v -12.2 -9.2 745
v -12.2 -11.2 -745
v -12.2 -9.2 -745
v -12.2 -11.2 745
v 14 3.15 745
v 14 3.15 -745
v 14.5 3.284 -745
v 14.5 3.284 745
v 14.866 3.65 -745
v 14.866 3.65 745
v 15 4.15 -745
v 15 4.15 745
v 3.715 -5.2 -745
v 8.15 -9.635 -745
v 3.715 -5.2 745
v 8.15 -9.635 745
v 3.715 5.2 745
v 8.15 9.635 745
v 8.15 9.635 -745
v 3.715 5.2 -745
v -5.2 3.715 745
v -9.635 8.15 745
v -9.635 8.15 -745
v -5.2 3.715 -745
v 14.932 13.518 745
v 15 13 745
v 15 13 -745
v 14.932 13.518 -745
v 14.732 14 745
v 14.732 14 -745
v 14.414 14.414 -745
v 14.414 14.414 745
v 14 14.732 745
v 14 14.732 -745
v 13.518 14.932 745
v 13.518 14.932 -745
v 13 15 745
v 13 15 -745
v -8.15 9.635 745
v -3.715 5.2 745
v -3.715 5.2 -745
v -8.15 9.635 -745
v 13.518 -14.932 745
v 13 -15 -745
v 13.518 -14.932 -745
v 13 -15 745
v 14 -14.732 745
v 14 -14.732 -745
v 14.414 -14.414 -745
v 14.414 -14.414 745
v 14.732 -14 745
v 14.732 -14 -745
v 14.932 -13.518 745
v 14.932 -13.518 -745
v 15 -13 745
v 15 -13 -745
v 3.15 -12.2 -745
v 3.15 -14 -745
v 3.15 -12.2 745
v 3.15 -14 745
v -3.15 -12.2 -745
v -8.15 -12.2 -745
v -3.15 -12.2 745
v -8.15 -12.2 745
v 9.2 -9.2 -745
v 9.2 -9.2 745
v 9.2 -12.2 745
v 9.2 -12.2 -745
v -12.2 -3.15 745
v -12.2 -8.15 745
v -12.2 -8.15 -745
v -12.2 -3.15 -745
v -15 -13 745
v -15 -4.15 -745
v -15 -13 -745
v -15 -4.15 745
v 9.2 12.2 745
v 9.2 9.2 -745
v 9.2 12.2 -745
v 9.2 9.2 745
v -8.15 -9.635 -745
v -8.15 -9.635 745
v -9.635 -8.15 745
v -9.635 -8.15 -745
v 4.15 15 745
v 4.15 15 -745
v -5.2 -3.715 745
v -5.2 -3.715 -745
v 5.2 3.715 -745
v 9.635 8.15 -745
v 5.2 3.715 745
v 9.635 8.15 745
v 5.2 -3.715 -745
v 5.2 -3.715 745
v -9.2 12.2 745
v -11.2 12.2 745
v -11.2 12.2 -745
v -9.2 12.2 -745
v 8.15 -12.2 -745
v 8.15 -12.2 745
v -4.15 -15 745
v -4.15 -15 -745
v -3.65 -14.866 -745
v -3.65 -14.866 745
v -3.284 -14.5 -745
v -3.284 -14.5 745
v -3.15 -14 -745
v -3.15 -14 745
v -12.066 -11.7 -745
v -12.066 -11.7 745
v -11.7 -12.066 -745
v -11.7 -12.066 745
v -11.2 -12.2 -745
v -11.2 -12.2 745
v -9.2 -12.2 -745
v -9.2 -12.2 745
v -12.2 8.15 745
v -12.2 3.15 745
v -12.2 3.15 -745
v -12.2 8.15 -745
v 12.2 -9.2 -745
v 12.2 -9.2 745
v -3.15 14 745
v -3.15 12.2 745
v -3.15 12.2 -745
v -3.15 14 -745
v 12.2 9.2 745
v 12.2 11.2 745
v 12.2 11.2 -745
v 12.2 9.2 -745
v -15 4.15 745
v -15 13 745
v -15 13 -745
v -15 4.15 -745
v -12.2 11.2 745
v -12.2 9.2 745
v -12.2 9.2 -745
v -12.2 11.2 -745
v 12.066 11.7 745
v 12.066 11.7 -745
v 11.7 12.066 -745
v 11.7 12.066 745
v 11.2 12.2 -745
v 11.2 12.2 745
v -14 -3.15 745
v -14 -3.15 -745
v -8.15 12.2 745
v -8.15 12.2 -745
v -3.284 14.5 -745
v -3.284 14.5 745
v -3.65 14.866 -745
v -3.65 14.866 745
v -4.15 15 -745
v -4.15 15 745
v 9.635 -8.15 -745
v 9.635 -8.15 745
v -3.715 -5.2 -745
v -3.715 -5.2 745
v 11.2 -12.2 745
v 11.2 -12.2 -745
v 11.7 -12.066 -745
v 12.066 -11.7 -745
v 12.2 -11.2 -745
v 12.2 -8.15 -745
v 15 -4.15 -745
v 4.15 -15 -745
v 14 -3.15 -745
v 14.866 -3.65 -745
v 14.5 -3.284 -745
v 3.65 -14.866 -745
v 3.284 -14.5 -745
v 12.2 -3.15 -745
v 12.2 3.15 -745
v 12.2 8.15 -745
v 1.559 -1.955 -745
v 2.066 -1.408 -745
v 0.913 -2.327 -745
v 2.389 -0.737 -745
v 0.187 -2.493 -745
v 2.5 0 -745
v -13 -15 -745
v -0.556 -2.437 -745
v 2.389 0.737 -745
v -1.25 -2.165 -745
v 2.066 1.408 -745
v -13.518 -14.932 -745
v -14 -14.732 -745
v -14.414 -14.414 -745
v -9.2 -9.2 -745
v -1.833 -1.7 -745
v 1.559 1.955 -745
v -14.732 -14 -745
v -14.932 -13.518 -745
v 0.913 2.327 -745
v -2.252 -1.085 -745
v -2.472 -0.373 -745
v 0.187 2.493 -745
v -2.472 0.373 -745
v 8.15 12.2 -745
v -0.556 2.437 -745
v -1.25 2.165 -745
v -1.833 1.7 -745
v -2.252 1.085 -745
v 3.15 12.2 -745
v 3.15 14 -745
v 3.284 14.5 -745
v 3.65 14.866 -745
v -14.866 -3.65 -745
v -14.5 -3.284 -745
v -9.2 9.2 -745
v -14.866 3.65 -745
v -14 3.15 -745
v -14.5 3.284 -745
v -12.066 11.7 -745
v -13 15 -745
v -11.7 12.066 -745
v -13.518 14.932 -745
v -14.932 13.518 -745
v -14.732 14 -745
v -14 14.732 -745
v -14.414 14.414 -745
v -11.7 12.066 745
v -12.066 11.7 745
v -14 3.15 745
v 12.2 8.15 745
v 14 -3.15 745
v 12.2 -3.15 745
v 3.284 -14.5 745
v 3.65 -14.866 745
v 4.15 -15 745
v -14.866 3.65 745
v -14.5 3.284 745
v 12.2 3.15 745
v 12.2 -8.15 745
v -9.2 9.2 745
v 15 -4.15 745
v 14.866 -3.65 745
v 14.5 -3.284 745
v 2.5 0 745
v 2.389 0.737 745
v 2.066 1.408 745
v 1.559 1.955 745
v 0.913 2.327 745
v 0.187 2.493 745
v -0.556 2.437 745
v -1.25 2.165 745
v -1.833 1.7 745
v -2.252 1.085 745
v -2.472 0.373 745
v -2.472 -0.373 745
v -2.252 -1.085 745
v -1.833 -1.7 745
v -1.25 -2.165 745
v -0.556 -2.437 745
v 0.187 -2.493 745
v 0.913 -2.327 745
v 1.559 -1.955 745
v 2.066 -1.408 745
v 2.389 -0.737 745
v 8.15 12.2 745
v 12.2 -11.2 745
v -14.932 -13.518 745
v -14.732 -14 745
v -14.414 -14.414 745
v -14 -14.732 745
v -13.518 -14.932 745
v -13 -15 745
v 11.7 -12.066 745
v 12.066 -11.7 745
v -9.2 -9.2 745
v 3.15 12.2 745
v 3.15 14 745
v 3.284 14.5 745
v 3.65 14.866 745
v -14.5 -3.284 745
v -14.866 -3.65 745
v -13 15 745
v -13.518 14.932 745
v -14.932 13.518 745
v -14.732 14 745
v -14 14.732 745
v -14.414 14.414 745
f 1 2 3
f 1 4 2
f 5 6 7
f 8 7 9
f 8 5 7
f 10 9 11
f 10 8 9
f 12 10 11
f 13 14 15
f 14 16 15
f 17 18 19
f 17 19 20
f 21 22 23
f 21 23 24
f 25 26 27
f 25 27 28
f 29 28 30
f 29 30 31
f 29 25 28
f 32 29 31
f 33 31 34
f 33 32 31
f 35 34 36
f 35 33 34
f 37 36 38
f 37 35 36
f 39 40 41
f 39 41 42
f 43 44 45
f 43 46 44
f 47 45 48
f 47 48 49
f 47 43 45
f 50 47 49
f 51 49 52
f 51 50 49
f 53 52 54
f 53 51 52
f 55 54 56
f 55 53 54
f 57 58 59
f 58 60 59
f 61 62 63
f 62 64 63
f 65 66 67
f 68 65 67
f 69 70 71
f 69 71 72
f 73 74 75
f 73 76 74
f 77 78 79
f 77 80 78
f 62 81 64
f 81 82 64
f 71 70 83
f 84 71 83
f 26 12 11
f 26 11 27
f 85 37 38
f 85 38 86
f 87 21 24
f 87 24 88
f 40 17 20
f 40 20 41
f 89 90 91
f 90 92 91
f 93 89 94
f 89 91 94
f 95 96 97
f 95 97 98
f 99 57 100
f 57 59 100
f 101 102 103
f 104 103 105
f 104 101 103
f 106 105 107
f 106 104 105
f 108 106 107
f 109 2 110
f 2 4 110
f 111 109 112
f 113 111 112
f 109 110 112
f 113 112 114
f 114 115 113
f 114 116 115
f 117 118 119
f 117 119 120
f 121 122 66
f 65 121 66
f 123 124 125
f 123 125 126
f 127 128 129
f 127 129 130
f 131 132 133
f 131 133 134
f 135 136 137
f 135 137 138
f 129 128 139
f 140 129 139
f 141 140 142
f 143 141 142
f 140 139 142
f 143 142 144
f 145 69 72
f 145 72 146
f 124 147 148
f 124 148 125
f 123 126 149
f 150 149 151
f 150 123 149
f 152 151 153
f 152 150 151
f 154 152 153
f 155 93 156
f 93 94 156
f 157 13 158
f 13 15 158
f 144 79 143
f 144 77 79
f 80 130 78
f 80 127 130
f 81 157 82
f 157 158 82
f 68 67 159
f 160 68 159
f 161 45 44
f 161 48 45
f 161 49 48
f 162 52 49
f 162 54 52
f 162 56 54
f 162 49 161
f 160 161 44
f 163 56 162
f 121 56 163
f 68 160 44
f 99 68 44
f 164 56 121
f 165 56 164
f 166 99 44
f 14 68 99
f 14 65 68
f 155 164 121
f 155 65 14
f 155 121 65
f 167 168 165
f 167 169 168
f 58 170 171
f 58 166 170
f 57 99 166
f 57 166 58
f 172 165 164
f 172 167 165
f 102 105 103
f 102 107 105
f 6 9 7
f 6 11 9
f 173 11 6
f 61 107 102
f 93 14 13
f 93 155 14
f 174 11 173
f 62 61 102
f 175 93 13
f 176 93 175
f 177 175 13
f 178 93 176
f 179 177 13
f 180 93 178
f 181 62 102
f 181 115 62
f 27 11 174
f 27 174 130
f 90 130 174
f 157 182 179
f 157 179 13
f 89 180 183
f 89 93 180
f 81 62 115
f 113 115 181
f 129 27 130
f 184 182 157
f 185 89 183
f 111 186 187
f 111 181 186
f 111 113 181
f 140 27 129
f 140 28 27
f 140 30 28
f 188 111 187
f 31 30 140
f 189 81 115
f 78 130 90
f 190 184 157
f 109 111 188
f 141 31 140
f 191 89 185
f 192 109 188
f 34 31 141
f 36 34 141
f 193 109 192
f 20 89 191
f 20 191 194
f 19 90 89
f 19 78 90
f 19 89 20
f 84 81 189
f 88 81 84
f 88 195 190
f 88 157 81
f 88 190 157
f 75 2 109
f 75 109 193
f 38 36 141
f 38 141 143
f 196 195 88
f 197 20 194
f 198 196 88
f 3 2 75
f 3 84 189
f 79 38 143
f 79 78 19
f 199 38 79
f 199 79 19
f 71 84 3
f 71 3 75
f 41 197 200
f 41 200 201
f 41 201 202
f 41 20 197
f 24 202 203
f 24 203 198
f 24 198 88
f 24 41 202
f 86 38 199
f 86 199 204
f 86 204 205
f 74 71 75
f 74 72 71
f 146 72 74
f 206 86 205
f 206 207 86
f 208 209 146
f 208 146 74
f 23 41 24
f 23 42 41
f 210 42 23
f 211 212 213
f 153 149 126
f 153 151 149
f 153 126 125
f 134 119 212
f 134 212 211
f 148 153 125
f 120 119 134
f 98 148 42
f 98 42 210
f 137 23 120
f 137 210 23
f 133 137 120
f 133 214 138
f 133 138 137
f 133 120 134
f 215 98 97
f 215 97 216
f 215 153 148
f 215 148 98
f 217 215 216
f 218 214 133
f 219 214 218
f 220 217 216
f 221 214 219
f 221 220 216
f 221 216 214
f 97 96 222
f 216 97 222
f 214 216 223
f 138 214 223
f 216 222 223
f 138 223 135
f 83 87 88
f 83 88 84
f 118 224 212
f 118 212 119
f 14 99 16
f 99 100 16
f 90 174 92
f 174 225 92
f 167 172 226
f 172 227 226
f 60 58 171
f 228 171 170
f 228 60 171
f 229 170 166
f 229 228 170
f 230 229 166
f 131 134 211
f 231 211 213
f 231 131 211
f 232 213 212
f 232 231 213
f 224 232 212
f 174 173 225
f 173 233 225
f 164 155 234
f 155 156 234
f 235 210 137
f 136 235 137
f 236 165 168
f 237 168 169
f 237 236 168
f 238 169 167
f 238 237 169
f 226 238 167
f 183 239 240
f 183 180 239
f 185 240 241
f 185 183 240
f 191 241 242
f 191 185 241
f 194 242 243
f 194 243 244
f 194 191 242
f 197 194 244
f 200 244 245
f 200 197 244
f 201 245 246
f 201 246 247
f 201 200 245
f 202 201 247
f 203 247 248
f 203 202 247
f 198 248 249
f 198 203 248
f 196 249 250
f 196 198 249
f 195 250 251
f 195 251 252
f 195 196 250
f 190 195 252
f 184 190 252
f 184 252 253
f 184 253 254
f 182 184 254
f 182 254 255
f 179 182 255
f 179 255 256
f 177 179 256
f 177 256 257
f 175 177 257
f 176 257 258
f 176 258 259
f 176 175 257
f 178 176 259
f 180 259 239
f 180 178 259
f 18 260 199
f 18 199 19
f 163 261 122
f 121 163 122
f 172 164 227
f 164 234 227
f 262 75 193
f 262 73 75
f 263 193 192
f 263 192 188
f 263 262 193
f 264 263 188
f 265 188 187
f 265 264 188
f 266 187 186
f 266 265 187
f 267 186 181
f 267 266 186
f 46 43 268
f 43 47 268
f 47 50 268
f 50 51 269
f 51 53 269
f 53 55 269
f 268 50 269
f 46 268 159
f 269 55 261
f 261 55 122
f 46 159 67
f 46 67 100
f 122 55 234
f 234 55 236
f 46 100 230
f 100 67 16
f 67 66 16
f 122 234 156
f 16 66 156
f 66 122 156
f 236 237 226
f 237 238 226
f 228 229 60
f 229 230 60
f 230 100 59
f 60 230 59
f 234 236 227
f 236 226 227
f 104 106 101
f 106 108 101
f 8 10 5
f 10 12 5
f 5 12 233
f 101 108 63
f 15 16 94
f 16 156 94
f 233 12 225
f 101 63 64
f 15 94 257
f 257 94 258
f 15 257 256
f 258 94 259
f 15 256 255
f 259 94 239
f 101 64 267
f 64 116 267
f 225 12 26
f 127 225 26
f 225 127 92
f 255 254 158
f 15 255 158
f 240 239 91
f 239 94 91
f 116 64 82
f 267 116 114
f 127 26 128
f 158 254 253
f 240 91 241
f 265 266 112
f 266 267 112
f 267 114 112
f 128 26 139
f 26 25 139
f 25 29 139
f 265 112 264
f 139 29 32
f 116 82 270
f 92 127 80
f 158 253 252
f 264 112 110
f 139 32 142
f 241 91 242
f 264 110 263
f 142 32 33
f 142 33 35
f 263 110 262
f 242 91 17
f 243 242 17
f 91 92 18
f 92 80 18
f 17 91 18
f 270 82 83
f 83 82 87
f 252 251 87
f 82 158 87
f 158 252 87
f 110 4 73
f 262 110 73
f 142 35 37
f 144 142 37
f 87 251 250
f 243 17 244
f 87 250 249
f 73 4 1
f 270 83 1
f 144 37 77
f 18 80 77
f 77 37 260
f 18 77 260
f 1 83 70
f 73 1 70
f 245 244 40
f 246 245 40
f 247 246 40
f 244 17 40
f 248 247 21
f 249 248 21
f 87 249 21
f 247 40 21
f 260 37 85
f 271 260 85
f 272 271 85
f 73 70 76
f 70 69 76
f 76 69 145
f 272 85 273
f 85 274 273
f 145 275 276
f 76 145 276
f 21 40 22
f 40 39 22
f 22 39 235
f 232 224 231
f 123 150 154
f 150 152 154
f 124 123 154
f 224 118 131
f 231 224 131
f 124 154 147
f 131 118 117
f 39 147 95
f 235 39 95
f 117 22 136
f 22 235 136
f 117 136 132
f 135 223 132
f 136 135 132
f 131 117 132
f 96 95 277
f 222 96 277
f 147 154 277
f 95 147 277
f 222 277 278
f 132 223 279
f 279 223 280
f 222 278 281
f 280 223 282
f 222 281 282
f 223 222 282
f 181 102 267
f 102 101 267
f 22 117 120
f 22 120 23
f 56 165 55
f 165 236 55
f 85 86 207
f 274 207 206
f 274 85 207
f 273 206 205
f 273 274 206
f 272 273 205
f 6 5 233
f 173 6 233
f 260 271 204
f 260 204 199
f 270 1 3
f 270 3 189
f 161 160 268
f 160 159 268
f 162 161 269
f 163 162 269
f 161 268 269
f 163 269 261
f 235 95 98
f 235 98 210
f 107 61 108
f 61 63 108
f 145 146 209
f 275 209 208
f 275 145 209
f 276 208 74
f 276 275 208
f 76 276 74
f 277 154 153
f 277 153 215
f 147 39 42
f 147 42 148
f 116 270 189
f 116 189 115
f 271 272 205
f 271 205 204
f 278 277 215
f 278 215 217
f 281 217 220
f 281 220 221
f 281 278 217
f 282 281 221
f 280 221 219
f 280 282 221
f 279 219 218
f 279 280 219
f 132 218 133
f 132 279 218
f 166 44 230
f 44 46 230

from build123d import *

# Parameters (mm, degrees)
SKETCH_R  = 2.5
PAD_DEPTH = 745


with BuildPart() as part:
    # Sketch → Pad (new body, symmetric)
    with BuildSketch(Plane.XY):
        with BuildLine():
            Line((14, 3.15), (12.2, 3.15))
            Line((12.2, 3.15), (12.2, 8.15))
            Line((12.2, 8.15), (9.634924, 8.15))
            Line((9.634924, 8.15), (5.2, 3.715076))
            Line((5.2, 3.715076), (5.2, -3.715076))
            Line((5.2, -3.715076), (9.634924, -8.15))
            Line((9.634924, -8.15), (12.2, -8.15))
            Line((12.2, -8.15), (12.2, -3.15))
            Line((12.2, -3.15), (14, -3.15))
            ThreePointArc((15, -4.15), (14.707107, -3.442893), (14, -3.15))
            Line((15, -4.15), (15, -13))
            ThreePointArc((13, -15), (14.414214, -14.414214), (15, -13))
            Line((13, -15), (4.15, -15))
            ThreePointArc((3.15, -14), (3.442893, -14.707107), (4.15, -15))
            Line((3.15, -14), (3.15, -12.2))
            Line((3.15, -12.2), (8.15, -12.2))
            Line((8.15, -12.2), (8.15, -9.634924))
            Line((8.15, -9.634924), (3.715076, -5.2))
            Line((3.715076, -5.2), (-3.715076, -5.2))
            Line((-3.715076, -5.2), (-8.15, -9.634924))
            Line((-8.15, -9.634924), (-8.15, -12.2))
            Line((-8.15, -12.2), (-3.15, -12.2))
            Line((-3.15, -12.2), (-3.15, -14))
            ThreePointArc((-4.15, -15), (-3.442893, -14.707107), (-3.15, -14))
            Line((-4.15, -15), (-13, -15))
            ThreePointArc((-15, -13), (-14.414214, -14.414214), (-13, -15))
            Line((-15, -4.15), (-15, -13))
            ThreePointArc((-14, -3.15), (-14.707107, -3.442893), (-15, -4.15))
            Line((-12.2, -3.15), (-14, -3.15))
            Line((-12.2, -8.15), (-12.2, -3.15))
            Line((-12.2, -8.15), (-9.634924, -8.15))
            Line((-5.2, -3.715076), (-9.634924, -8.15))
            Line((-5.2, 3.715076), (-5.2, -3.715076))
            Line((-9.634924, 8.15), (-5.2, 3.715076))
            Line((-12.2, 8.15), (-9.634924, 8.15))
            Line((-12.2, 3.15), (-12.2, 8.15))
            Line((-14, 3.15), (-12.2, 3.15))
            ThreePointArc((-15, 4.15), (-14.707107, 3.442893), (-14, 3.15))
            Line((-15, 13), (-15, 4.15))
            ThreePointArc((-13, 15), (-14.414214, 14.414214), (-15, 13))
            Line((-4.15, 15), (-13, 15))
            ThreePointArc((-3.15, 14), (-3.442893, 14.707107), (-4.15, 15))
            Line((-3.15, 12.2), (-3.15, 14))
            Line((-8.15, 12.2), (-3.15, 12.2))
            Line((-8.15, 9.634924), (-8.15, 12.2))
            Line((-3.715076, 5.2), (-8.15, 9.634924))
            Line((3.715076, 5.2), (-3.715076, 5.2))
            Line((8.15, 9.634924), (3.715076, 5.2))
            Line((8.15, 12.2), (8.15, 9.634924))
            Line((3.15, 12.2), (8.15, 12.2))
            Line((3.15, 14), (3.15, 12.2))
            ThreePointArc((4.15, 15), (3.442893, 14.707107), (3.15, 14))
            Line((13, 15), (4.15, 15))
            ThreePointArc((15, 13), (14.414214, 14.414214), (13, 15))
            Line((15, 4.15), (15, 13))
            ThreePointArc((14, 3.15), (14.707107, 3.442893), (15, 4.15))
        make_face()
        Circle(SKETCH_R, mode=Mode.SUBTRACT)
        with BuildLine():
            Line((9.2, 12.2), (11.2, 12.2))
            ThreePointArc((12.2, 11.2), (11.907107, 11.907107), (11.2, 12.2))
            Line((12.2, 11.2), (12.2, 9.2))
            Line((12.2, 9.2), (9.2, 9.2))
            Line((9.2, 9.2), (9.2, 12.2))
        make_face(mode=Mode.SUBTRACT)
        with BuildLine():
            ThreePointArc((-11.2, 12.2), (-11.907107, 11.907107), (-12.2, 11.2))
            Line((-12.2, 9.2), (-12.2, 11.2))
            Line((-9.2, 9.2), (-12.2, 9.2))
            Line((-9.2, 12.2), (-9.2, 9.2))
            Line((-11.2, 12.2), (-9.2, 12.2))
        make_face(mode=Mode.SUBTRACT)
        with BuildLine():
            ThreePointArc((-12.2, -11.2), (-11.907107, -11.907107), (-11.2, -12.2))
            Line((-9.2, -12.2), (-11.2, -12.2))
            Line((-9.2, -9.2), (-9.2, -12.2))
            Line((-12.2, -9.2), (-9.2, -9.2))
            Line((-12.2, -11.2), (-12.2, -9.2))
        make_face(mode=Mode.SUBTRACT)
        with BuildLine():
            ThreePointArc((11.2, -12.2), (11.907107, -11.907107), (12.2, -11.2))
            Line((12.2, -11.2), (12.2, -9.2))
            Line((12.2, -9.2), (9.2, -9.2))
            Line((9.2, -9.2), (9.2, -12.2))
            Line((9.2, -12.2), (11.2, -12.2))
        make_face(mode=Mode.SUBTRACT)
    extrude(amount=PAD_DEPTH, both=True)


solid = part.part
